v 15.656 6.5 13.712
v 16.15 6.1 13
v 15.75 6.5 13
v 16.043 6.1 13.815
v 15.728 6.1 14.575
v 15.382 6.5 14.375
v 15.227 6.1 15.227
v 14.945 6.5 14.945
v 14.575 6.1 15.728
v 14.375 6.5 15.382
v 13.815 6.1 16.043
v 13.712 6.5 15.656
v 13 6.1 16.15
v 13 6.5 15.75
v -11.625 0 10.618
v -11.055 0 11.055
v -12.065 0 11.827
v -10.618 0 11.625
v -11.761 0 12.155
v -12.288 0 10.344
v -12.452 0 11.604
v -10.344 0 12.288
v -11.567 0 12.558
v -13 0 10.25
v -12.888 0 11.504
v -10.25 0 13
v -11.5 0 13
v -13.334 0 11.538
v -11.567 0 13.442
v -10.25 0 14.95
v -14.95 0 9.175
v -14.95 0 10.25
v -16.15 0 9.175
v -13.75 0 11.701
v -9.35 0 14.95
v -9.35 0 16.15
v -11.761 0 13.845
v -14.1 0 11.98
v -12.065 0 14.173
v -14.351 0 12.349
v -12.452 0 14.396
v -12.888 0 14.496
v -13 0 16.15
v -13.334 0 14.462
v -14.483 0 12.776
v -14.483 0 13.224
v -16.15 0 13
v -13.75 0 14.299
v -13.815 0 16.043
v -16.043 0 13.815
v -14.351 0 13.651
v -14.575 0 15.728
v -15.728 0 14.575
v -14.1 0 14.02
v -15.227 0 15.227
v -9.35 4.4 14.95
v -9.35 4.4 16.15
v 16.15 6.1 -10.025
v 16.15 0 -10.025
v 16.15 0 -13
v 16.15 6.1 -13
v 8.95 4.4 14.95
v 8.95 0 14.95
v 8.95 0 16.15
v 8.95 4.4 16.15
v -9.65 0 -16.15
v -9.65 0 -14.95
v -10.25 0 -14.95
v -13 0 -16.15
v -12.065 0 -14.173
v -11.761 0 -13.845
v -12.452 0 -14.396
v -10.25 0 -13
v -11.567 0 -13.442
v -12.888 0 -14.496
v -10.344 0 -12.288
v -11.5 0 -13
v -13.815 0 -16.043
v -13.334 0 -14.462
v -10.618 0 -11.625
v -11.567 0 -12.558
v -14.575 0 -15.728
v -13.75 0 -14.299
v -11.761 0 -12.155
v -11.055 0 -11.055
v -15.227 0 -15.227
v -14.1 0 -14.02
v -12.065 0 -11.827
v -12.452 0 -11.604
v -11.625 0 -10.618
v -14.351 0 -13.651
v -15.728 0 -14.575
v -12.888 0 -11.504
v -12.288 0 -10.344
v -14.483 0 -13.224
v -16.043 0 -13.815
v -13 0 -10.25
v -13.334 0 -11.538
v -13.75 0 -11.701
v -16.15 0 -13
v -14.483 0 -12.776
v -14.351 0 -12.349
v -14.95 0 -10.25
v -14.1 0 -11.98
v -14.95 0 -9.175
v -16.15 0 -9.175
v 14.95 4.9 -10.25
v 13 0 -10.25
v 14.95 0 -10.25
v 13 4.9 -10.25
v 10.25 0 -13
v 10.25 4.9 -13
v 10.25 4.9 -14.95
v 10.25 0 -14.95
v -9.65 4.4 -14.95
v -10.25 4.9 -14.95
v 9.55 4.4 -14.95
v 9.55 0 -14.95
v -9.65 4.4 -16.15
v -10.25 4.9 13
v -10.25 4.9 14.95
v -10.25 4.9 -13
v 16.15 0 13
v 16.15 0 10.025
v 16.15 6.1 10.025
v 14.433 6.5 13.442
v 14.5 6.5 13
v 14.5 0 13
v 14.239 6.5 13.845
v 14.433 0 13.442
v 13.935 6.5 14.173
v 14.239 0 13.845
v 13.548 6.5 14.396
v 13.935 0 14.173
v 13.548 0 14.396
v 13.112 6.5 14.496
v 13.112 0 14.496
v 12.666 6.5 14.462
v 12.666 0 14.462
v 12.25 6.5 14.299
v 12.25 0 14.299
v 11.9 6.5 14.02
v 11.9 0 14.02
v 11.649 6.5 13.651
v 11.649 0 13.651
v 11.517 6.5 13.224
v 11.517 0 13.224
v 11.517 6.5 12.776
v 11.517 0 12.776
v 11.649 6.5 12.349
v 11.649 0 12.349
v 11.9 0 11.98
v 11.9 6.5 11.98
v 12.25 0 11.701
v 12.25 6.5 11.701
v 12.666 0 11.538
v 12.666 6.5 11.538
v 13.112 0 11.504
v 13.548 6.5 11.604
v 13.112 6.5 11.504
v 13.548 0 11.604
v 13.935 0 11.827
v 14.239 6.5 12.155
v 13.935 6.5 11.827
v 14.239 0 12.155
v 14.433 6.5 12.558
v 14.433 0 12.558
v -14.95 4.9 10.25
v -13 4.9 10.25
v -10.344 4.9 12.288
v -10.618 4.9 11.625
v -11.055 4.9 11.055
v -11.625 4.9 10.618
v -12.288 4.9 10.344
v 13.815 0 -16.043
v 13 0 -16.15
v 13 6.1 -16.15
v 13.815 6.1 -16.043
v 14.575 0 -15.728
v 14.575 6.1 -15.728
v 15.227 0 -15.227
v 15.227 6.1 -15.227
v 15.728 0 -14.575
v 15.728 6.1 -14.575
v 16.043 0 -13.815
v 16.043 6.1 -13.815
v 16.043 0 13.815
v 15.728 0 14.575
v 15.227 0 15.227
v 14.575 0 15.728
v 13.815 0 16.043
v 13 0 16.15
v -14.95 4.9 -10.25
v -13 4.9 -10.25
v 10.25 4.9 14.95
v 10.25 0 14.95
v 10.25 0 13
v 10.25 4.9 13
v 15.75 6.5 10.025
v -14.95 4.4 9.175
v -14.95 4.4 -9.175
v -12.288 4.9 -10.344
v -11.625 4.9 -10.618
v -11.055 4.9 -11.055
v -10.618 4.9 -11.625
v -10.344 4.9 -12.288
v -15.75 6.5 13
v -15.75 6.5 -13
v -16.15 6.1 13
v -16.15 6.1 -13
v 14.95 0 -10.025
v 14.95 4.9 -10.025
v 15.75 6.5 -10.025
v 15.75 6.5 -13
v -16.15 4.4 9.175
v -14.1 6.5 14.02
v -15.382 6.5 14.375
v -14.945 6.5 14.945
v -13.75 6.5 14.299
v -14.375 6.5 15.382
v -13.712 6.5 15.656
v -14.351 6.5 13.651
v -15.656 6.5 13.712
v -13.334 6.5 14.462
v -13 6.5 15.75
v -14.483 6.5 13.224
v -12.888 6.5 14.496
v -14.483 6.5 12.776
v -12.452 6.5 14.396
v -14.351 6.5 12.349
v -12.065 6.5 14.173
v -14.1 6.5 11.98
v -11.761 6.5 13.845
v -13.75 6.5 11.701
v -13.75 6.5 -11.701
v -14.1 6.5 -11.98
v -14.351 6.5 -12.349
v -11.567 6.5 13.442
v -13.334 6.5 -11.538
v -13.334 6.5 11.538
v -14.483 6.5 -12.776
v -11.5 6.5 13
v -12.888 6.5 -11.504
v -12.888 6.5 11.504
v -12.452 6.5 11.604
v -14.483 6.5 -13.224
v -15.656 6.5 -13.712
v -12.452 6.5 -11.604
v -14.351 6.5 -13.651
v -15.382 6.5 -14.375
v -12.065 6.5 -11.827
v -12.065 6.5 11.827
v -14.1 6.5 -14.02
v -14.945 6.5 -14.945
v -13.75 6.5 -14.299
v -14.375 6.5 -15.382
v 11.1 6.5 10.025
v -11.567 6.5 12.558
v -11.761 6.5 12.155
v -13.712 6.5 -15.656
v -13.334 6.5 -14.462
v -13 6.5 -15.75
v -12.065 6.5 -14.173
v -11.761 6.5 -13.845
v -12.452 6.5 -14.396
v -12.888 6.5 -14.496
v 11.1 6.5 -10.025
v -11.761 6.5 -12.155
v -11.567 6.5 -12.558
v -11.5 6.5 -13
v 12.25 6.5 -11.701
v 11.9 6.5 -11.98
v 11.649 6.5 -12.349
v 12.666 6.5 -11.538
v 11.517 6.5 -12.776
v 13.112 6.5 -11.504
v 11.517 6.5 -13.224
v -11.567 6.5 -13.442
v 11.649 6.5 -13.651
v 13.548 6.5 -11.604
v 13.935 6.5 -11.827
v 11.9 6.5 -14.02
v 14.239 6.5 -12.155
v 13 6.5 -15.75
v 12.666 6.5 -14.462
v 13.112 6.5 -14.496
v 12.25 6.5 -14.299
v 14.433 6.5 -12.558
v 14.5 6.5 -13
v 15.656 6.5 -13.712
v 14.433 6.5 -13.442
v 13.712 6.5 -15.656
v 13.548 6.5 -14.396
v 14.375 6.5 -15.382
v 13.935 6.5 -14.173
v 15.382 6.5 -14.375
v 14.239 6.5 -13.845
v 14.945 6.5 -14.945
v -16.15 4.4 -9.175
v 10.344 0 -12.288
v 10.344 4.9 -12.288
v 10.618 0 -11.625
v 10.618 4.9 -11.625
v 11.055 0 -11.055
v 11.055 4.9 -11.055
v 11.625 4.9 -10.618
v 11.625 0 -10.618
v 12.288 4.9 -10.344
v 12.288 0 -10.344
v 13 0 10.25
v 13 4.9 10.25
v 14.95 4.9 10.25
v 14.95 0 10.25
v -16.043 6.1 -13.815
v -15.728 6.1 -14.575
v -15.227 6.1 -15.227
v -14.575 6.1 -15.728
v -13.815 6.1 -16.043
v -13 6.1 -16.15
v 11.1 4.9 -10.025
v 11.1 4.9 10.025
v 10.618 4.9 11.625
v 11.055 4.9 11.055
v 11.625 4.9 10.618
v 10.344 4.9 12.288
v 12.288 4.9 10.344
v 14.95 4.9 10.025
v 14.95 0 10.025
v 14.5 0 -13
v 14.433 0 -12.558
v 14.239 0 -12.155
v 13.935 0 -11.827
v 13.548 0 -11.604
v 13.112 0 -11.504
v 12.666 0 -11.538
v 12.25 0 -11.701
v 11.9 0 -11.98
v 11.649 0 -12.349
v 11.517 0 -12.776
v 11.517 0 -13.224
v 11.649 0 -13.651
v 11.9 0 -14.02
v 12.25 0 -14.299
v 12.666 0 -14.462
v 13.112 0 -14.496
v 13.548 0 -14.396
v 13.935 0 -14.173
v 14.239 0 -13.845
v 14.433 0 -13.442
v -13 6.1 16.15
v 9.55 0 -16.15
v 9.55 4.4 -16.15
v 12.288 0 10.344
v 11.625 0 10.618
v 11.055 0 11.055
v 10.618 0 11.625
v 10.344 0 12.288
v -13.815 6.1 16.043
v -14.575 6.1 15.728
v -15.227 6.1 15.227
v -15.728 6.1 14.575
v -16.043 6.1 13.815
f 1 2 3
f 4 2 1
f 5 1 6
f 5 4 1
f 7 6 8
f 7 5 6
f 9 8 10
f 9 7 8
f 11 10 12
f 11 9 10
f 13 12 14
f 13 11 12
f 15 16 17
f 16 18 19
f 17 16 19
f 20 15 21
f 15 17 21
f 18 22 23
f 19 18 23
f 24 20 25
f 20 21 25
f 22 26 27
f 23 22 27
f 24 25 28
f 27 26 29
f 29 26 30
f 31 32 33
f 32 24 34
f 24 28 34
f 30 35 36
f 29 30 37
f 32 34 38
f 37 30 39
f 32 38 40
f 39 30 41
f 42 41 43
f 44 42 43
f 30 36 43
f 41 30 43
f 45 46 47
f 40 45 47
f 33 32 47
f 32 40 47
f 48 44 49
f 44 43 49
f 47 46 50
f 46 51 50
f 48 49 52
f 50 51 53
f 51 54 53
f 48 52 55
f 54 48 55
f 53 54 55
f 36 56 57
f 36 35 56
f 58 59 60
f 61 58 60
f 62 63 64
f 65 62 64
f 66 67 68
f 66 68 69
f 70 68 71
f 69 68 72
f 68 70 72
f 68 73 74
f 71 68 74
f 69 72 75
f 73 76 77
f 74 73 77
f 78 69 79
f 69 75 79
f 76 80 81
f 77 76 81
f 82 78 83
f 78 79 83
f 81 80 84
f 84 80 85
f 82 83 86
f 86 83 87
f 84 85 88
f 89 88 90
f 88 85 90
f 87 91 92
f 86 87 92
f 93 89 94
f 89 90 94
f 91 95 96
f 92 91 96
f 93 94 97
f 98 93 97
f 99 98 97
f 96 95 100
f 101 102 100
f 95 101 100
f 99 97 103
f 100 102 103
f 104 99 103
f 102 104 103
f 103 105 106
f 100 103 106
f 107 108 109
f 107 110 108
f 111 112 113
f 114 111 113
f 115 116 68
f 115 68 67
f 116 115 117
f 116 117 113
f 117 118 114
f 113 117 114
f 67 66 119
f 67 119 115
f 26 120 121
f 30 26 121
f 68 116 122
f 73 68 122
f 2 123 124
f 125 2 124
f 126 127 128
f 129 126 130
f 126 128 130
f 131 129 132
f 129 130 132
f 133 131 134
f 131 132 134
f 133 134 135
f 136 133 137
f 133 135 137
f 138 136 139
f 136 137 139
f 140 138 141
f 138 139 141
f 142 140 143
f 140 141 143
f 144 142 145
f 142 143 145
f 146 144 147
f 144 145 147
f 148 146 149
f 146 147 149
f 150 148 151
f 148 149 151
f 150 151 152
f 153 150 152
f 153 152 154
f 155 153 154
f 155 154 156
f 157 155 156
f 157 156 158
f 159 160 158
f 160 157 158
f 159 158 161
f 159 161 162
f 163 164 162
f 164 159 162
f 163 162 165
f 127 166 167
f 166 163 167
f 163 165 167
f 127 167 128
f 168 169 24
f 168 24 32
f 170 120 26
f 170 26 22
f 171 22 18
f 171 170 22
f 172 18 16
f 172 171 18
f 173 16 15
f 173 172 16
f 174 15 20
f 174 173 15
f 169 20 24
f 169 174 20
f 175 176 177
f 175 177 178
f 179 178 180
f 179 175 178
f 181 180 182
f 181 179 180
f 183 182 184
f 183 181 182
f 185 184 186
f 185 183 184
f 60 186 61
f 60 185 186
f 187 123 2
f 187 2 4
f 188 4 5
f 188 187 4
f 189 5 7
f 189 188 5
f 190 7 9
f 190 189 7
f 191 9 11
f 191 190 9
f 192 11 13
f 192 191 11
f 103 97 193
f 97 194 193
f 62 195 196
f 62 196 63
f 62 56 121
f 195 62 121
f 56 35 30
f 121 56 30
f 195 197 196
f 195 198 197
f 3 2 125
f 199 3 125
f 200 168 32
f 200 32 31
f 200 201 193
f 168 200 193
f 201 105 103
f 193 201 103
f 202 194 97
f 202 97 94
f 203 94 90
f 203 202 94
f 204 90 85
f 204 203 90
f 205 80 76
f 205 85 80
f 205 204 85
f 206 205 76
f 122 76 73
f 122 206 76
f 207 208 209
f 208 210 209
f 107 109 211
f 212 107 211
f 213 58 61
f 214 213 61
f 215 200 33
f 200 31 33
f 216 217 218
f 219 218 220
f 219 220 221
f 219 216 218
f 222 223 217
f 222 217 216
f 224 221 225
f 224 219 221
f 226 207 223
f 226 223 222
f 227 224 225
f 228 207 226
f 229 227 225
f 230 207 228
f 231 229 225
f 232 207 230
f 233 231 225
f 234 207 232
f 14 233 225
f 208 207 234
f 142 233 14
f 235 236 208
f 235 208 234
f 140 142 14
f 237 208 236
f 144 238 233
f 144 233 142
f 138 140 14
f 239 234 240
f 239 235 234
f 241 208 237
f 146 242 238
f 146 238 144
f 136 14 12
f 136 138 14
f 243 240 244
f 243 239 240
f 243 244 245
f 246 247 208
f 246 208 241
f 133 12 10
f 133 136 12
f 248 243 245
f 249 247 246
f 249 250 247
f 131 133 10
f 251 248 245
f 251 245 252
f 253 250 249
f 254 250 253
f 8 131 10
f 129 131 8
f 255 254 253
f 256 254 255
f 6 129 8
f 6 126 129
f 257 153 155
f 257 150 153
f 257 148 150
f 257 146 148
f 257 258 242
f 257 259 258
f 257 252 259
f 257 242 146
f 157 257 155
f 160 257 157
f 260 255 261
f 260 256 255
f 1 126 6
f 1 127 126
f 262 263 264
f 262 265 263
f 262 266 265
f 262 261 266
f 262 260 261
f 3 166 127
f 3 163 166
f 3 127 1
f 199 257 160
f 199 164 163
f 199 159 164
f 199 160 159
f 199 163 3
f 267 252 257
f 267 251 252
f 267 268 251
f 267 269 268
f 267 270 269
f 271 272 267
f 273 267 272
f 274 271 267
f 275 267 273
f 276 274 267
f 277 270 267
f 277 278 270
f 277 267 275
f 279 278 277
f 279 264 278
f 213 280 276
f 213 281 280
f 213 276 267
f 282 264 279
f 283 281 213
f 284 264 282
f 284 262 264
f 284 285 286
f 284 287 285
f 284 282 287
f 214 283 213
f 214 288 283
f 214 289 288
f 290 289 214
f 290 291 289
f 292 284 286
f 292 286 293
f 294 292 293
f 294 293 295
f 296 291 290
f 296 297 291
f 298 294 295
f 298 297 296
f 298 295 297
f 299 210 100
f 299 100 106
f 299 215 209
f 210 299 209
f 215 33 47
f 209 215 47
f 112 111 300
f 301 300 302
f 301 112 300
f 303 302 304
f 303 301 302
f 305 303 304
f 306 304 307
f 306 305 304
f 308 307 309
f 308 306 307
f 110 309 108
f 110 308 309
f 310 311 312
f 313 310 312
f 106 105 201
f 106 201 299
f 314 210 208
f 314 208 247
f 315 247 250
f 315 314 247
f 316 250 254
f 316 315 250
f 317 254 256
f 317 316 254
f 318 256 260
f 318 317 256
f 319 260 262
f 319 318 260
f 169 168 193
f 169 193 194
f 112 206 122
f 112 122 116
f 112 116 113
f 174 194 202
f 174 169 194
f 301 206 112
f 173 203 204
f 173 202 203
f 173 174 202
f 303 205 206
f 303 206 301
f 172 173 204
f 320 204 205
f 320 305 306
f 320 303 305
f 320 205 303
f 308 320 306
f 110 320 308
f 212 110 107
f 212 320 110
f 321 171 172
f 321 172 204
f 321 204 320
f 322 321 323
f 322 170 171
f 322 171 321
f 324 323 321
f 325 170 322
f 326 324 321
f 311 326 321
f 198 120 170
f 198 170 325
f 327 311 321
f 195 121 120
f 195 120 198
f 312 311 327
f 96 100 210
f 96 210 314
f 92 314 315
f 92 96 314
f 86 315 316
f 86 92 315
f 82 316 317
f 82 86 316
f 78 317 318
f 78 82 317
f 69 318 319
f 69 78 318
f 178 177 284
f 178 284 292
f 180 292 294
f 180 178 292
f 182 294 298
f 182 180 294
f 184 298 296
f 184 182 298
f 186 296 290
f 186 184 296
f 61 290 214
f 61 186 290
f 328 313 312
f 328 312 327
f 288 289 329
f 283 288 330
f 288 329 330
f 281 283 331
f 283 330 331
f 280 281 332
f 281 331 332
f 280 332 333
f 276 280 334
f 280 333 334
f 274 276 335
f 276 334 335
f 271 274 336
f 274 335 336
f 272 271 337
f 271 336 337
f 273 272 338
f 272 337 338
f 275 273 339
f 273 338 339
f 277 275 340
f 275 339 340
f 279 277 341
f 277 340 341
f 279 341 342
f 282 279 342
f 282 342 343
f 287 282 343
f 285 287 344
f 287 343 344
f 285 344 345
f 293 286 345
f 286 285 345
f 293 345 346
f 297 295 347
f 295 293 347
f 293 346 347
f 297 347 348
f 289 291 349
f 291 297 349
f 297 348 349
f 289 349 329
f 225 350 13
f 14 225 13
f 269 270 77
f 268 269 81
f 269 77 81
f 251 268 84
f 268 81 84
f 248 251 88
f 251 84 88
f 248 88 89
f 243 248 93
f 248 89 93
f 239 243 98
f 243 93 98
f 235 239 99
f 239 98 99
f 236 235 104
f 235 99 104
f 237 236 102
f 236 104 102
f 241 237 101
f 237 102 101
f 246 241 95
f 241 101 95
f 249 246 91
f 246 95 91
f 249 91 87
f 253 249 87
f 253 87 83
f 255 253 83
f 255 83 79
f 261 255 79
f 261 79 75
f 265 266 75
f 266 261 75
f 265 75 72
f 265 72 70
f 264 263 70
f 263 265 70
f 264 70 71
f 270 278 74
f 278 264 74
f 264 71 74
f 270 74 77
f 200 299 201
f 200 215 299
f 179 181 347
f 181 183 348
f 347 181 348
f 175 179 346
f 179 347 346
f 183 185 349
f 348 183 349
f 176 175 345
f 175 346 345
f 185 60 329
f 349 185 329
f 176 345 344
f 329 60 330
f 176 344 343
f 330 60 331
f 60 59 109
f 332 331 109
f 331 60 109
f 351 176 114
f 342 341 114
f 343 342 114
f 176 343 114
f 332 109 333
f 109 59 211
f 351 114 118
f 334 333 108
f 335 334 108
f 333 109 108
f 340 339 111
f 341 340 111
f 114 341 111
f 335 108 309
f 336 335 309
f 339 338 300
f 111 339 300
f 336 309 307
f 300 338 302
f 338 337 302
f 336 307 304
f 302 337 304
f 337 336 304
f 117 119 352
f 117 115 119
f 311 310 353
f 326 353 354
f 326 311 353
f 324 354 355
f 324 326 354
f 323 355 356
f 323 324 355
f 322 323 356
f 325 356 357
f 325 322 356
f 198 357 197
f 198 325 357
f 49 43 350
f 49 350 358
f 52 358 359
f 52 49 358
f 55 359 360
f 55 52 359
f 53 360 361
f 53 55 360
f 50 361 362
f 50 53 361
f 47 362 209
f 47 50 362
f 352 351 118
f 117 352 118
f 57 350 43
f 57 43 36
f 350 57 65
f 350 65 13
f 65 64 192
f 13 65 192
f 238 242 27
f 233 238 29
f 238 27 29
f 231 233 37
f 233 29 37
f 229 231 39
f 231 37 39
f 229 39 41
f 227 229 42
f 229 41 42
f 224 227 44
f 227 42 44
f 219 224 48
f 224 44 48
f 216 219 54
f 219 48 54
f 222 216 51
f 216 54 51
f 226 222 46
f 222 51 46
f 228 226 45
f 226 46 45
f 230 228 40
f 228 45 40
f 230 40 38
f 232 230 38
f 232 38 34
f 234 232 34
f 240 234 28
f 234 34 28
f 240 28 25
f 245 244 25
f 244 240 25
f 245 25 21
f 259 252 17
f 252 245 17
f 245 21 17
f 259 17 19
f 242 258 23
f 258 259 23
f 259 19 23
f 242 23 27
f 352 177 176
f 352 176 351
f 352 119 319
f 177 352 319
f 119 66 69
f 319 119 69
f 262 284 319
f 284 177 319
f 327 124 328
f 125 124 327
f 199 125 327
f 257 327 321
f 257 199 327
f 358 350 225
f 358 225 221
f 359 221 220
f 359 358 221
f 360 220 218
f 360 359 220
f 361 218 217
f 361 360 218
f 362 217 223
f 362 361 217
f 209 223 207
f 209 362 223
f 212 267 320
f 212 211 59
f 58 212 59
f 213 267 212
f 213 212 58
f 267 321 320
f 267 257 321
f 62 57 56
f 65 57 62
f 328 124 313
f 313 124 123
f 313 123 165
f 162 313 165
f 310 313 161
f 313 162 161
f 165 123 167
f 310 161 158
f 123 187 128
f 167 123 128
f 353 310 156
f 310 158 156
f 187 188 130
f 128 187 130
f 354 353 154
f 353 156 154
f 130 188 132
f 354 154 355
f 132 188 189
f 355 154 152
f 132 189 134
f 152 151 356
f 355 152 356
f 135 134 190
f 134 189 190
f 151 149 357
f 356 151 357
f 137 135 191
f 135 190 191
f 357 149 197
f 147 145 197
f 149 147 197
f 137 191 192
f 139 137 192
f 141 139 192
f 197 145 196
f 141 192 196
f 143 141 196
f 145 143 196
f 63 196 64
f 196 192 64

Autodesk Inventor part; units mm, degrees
ref_plane "YZ Plane" through (0, 0, 0) normal (1, 0, 0) x (0, 1, 0)
ref_plane "XZ Plane" through (0, 0, 0) normal (0, 1, 0) x (-1, 0, 0)
ref_plane "XY Plane" through (0, 0, 0) normal (0, 0, 1) x (1, 0, 0)
sketch "Sketch1" plane through (0, 0, 0) normal (0, 1, 0) x (-1, 0, 0)
  line L0 (16.15, 16.15) -> (-16.15, 16.15)
  line L1 (-16.15, 16.15) -> (-16.15, -16.15)
  line L2 (-16.15, -16.15) -> (16.15, -16.15)
  line L3 (16.15, -16.15) -> (16.15, 16.15)
  line L4 (16.15, 16.15) -> (-16.15, -16.15) construction
  line L5 (-16.15, 16.15) -> (16.15, -16.15) construction
  arc A0 (16.15, 13) -> (13, 16.15) centre (13, 13) ccw
  arc A1 (-13, 16.15) -> (-16.15, 13) centre (-13, 13) ccw
  arc A2 (-16.15, -13) -> (-13, -16.15) centre (-13, -13) ccw
  arc A3 (13, -16.15) -> (16.15, -13) centre (13, -13) ccw
  point P0 (0, 0)
  point P1 (13, -16.15)
  point P2 (16.15, -13)
  point P3 (-13, 16.15)
  point P4 (-16.15, 13)
  point P5 (-16.15, -13)
  point P6 (-13, -16.15)
  dimension "d0" = 32.3
  dimension "d1" = 3.15
  dimension "d4" = 360
extrude "Extrusion1" add sketch "Sketch1" along normal blind 7 contours A0 L3 A3 L2 A2 L1 A1 L0
sketch "Sketch2" plane through (0, 7, 0) normal (0, 1, 0) x (1, 0, 0)
  line L0 (-16.15, 13) -> (-16.15, -13) projected
  arc A0 (-16.15, -13) -> (-13, -16.15) centre (-13, -13) ccw projected
  line L1 (-13, -16.15) -> (13, -16.15) projected
  arc A1 (13, -16.15) -> (16.15, -13) centre (13, -13) ccw projected
  line L2 (16.15, -13) -> (16.15, 13) projected
  arc A2 (16.15, 13) -> (13, 16.15) centre (13, 13) ccw projected
  line L3 (13, 16.15) -> (-13, 16.15) projected
  arc A3 (-13, 16.15) -> (-16.15, 13) centre (-13, 13) ccw projected
  line L4 (16.15, -10.025) -> (11.1, -10.025)
  line L5 (11.1, -10.025) -> (11.1, 10.025)
  line L6 (11.1, 10.025) -> (16.15, 10.025)
  line L7 (16.15, 0) -> (11.5552, 0) construction
  point P0 (0, 0)
  point P1 (13.625, -10.025)
  point P2 (11.1, 0)
  dimension "d8" = 5.05
  dimension "d10" = 20.05
extrude "Extrusion2" cut sketch "Sketch2" against normal through all contours L2 L4 L5 L6
sketch "Sketch4" plane through (0, 0, 0) normal (0, -1, 0) x (1, 0, 0)
  line L0 (16.15, -10.025) -> (16.15, -13) projected
  arc A0 (13, -16.15) -> (16.15, -13) centre (13, -13) ccw projected
  line L1 (13, -16.15) -> (-13, -16.15) projected
  line L2 (16.15, 13) -> (16.15, 10.025) projected
  arc A1 (16.15, 13) -> (13, 16.15) centre (13, 13) ccw projected
  line L3 (-13, 16.15) -> (13, 16.15) projected
  arc A2 (-13, 16.15) -> (-16.15, 13) centre (-13, 13) ccw projected
  line L4 (-16.15, -13) -> (-16.15, 13) projected
  arc A3 (-16.15, -13) -> (-13, -16.15) centre (-13, -13) ccw projected
  line L5 (16.15, 13) -> (16.15, 10.025) projected
  arc A4 (14.95, 13) -> (13, 14.95) centre (13, 13) ccw
  line L6 (13, 14.95) -> (-13, 14.95)
  arc A5 (-13, 14.95) -> (-14.95, 13) centre (-13, 13) ccw
  line L7 (-14.95, 13) -> (-14.95, -13)
  arc A6 (-14.95, -13) -> (-13, -14.95) centre (-13, -13) ccw
  line L8 (-13, -14.95) -> (13, -14.95)
  arc A7 (13, -14.95) -> (14.95, -13) centre (13, -13) ccw
  line L9 (14.95, -13) -> (14.95, -10.025)
  line L10 (14.95, 13) -> (14.95, -10.025)
  point P0 (0, 0)
  dimension "d13" = 1.2
extrude "Extrusion3" cut sketch "Sketch4" against normal blind 6
sketch "Sketch5" plane through (0, 0, 0) normal (0, -1, 0) x (1, 0, 0)
  line L0 (14.95, 13) -> (14.95, 10.025) projected
  line L1 (14.95, 10.025) -> (16.15, 10.025) projected
  line L2 (16.15, 13) -> (16.15, 10.025) projected
  arc A0 (16.15, 13) -> (13, 16.15) centre (13, 13) ccw projected
  line L3 (-13, 16.15) -> (13, 16.15) projected
  arc A1 (-13, 16.15) -> (-16.15, 13) centre (-13, 13) ccw projected
  line L4 (-16.15, -13) -> (-16.15, 13) projected
  arc A2 (-16.15, -13) -> (-13, -16.15) centre (-13, -13) ccw projected
  line L5 (13, -16.15) -> (-13, -16.15) projected
  arc A3 (13, -16.15) -> (16.15, -13) centre (13, -13) ccw projected
  line L6 (16.15, -10.025) -> (16.15, -13) projected
  line L7 (16.15, -10.025) -> (14.95, -10.025) projected
  line L8 (14.95, -10.025) -> (14.95, -13) projected
  arc A4 (13, -14.95) -> (14.95, -13) centre (13, -13) ccw projected
  line L9 (13, -14.95) -> (-13, -14.95) projected
  arc A5 (-14.95, -13) -> (-13, -14.95) centre (-13, -13) ccw projected
  line L10 (-14.95, -13) -> (-14.95, 13) projected
  arc A6 (-13, 14.95) -> (-14.95, 13) centre (-13, 13) ccw projected
  line L11 (-13, 14.95) -> (13, 14.95) projected
  arc A7 (14.95, 13) -> (13, 14.95) centre (13, 13) ccw projected
  line L12 (-9.65, -16.15) -> (-9.65, -14.95)
  line L13 (9.55, -16.15) -> (9.55, -14.95)
  line L14 (-9.35, 14.95) -> (-9.35, 16.15)
  line L15 (8.95, 14.95) -> (8.95, 16.15)
  line L16 (-14.95, -9.175) -> (-16.15, -9.175)
  line L17 (-14.95, 0) -> (-14.0185, 0) construction
  line L18 (-14.95, 9.175) -> (-16.15, 9.175)
  point P0 (0, 0)
  dimension "d16" = 6.5
  dimension "d17" = 19.2
  dimension "d18" = 6.8
  dimension "d19" = 18.3
  dimension "d20" = 18.35
extrude "Extrusion4" cut sketch "Sketch5" against normal blind 4.4 contours L11 L14 L3 L15 | L10 L16 L4 L18 | L9 L13 L5 L12
sketch "Sketch6" plane through (0, 6, 0) normal (0, -1, 0) x (1, 0, 0)
  line L0 (8.95, 16.15) -> (8.95, 14.95) projected
  line L1 (-9.35, 14.95) -> (-9.35, 16.15) projected
  line L2 (-16.15, 9.175) -> (-14.95, 9.175) projected
  line L3 (-16.15, -13) -> (-16.15, 13) projected
  line L4 (13, -16.15) -> (-13, -16.15) projected
  line L5 (-16.15, 0) -> (-5.5986, 0) construction
  line L6 (0, -16.15) -> (0, -5.693) construction
  circle A0 centre (13, 13) radius 2.75
  circle A1 centre (13, -13) radius 2.75
  circle A2 centre (-13, 13) radius 2.75
  circle A3 centre (-13, -13) radius 2.75
  line L7 (11.1, -10.025) -> (16.15, -10.025) projected
  line L8 (16.15, -10.025) -> (16.15, -13) projected
  arc A4 (13, -16.15) -> (16.15, -13) centre (13, -13) ccw projected
  line L9 (13, -16.15) -> (-13, -16.15) projected
  arc A5 (-16.15, -13) -> (-13, -16.15) centre (-13, -13) ccw projected
  line L10 (-16.15, -13) -> (-16.15, 13) projected
  arc A6 (-13, 16.15) -> (-16.15, 13) centre (-13, 13) ccw projected
  line L11 (-13, 16.15) -> (13, 16.15) projected
  arc A7 (16.15, 13) -> (13, 16.15) centre (13, 13) ccw projected
  line L12 (16.15, 13) -> (16.15, 10.025) projected
  line L13 (16.15, 10.025) -> (11.1, 10.025) projected
  line L14 (11.1, 10.025) -> (11.1, -10.025) projected
  line L15 (-10.25, -16.15) -> (-10.25, -13)
  line L16 (-13, -10.25) -> (-16.15, -10.25)
  line L17 (13, -10.25) -> (16.15, -10.25)
  line L18 (10.25, -13) -> (10.25, -16.15)
  line L19 (13, 10.25) -> (16.15, 10.25)
  line L20 (10.25, 13) -> (10.25, 16.15)
  line L21 (-10.25, 13) -> (-10.25, 16.15)
  line L22 (-13, 10.25) -> (-16.15, 10.25)
  line L23 (14.95, 10.025) -> (11.1, 10.025) projected
  line L24 (14.95, 13) -> (14.95, 10.025) projected
  arc A8 (14.95, 13) -> (13, 14.95) centre (13, 13) ccw projected
  line L25 (-13, 14.95) -> (13, 14.95) projected
  arc A9 (-13, 14.95) -> (-14.95, 13) centre (-13, 13) ccw projected
  line L26 (-14.95, -13) -> (-14.95, 13) projected
  arc A10 (-14.95, -13) -> (-13, -14.95) centre (-13, -13) ccw projected
  line L27 (13, -14.95) -> (-13, -14.95) projected
  arc A11 (13, -14.95) -> (14.95, -13) centre (13, -13) ccw projected
  line L28 (14.95, -10.025) -> (14.95, -13) projected
  line L29 (11.1, -10.025) -> (14.95, -10.025) projected
  line L30 (11.1, 10.025) -> (11.1, -10.025) projected
  point P0 (0, 0)
  point P1 (14.95, -10.25)
  point P2 (10.25, -14.95)
  point P3 (-14.95, -10.25)
  point P4 (-10.25, -14.95)
  point P5 (-10.25, 14.95)
  point P6 (-14.95, 10.25)
  point P7 (10.25, 14.95)
  point P8 (14.95, 10.25)
  dimension "d48" = 5.5
  dimension "d49" = 26
  dimension "d50" = 26
extrude "Extrusion5" add sketch "Sketch6" along normal up to surface (6 mm away) contours L25 A0 L20 | L21 A2 L25 | A0 L25 A8 L24 | A2 L26 A9 L25 | A0 L24 L19 | L22 L26 A2 | L16 A3 L26 | A3 L27 A10 L26 | L15 L27 A3 | L28 A1 L17 | A1 L28 A11 L27 | L18 A1 L27 picked at (13.0785, 12.9333) picked at (-13.0785, 12.9333) picked at (-12.9333, -13.0785) picked at (12.9333, -13.0785)
sketch "Sketch7" plane through (0, 0, 0) normal (0, -1, 0) x (1, 0, 0)
  circle A0 centre (13, 13) radius 1.5
  line L0 (-16.15, -13) -> (-16.15, 13) projected
  line L1 (13, -16.15) -> (-13, -16.15) projected
  line L2 (0, -16.15) -> (0, -7.7699) construction
  line L3 (-16.15, 0) -> (-9.6467, 0) construction
  circle A1 centre (13, -13) radius 1.5
  circle A2 centre (-13, 13) radius 1.5
  circle A3 centre (-13, -13) radius 1.5
  point P0 (0, 0)
  dimension "d31" = 3
  dimension "d41" = 26
  dimension "d42" = 26
extrude "Extrusion6" cut sketch "Sketch7" against normal through all
sketch "Sketch9" plane through (0, 6, 0) normal (0, -1, 0) x (1, 0, 0)
  line L0 (11.1, -10.025) -> (14.95, -10.025) projected
  line L1 (11.1, 10.025) -> (11.1, -10.025) projected
  line L2 (14.95, 10.025) -> (11.1, 10.025) projected
  line L3 (-10.25, 14.95) -> (10.25, 14.95) projected
  line L4 (-14.95, -10.25) -> (-14.95, 10.25) projected
  line L5 (10.25, -14.95) -> (-10.25, -14.95) projected
  line L6 (14.95, 10.25) -> (14.95, 10.025) projected
  line L7 (14.95, -10.025) -> (14.95, -10.25) projected
  line L8 (-10.25, -13) -> (-10.25, -14.95) projected
  line L9 (10.25, -14.95) -> (10.25, -13) projected
  arc A0 (13, -10.25) -> (10.25, -13) centre (13, -13) ccw projected
  line L10 (13, -10.25) -> (14.95, -10.25) projected
  line L11 (14.95, 10.25) -> (13, 10.25) projected
  arc A1 (10.25, 13) -> (13, 10.25) centre (13, 13) ccw projected
  line L12 (10.25, 13) -> (10.25, 14.95) projected
  line L13 (-10.25, 14.95) -> (-10.25, 13) projected
  arc A2 (-13, 10.25) -> (-10.25, 13) centre (-13, 13) ccw projected
  line L14 (-13, 10.25) -> (-14.95, 10.25) projected
  line L15 (-14.95, -10.25) -> (-13, -10.25) projected
  arc A3 (-10.25, -13) -> (-13, -10.25) centre (-13, -13) ccw projected
  point P0 (0, 0)
extrude "Extrusion8" add sketch "Sketch9" along normal blind 1.1
sketch "Sketch10" plane through (0, 7, 0) normal (0, 1, 0) x (1, 0, 0)
  circle A0 centre (-13, 13) radius 1.5 projected
  circle A1 centre (13, 13) radius 1.5 projected
  circle A2 centre (13, -13) radius 1.5 projected
  circle A3 centre (-13, -13) radius 1.5 projected
  line L0 (11.1, 10.025) -> (16.15, 10.025) projected
  line L1 (16.15, 10.025) -> (16.15, 13) projected
  arc A4 (16.15, 13) -> (13, 16.15) centre (13, 13) ccw projected
  line L2 (13, 16.15) -> (-13, 16.15) projected
  arc A5 (-13, 16.15) -> (-16.15, 13) centre (-13, 13) ccw projected
  line L3 (-16.15, 13) -> (-16.15, -13) projected
  arc A6 (-16.15, -13) -> (-13, -16.15) centre (-13, -13) ccw projected
  line L4 (-13, -16.15) -> (13, -16.15) projected
  arc A7 (13, -16.15) -> (16.15, -13) centre (13, -13) ccw projected
  line L5 (16.15, -13) -> (16.15, -10.025) projected
  line L6 (16.15, -10.025) -> (11.1, -10.025) projected
  line L7 (11.1, -10.025) -> (11.1, 10.025) projected
  point P0 (0, 0)
extrude "Extrusion9" cut sketch "Sketch10" against normal blind 0.5
sketch "Sketch11" plane through (0, 0, 0) normal (0, -1, 0) x (1, 0, 0)
  point P0 (0, 0)
chamfer "Chamfer2" distance 0.4 angle 45 9 edges at (0, 6.5, -16.15) (15.2274, 6.5, -15.2274) (16.15, 6.5, -11.5125) (-15.2274, 6.5, -15.2274) (-16.15, 6.5, 0) (-15.2274, 6.5, 15.2274) (0, 6.5, 16.15) (15.2274, 6.5, 15.2274) (16.15, 6.5, 11.5125)
properties part number "oDrive_micro_cover_3DPrint"
